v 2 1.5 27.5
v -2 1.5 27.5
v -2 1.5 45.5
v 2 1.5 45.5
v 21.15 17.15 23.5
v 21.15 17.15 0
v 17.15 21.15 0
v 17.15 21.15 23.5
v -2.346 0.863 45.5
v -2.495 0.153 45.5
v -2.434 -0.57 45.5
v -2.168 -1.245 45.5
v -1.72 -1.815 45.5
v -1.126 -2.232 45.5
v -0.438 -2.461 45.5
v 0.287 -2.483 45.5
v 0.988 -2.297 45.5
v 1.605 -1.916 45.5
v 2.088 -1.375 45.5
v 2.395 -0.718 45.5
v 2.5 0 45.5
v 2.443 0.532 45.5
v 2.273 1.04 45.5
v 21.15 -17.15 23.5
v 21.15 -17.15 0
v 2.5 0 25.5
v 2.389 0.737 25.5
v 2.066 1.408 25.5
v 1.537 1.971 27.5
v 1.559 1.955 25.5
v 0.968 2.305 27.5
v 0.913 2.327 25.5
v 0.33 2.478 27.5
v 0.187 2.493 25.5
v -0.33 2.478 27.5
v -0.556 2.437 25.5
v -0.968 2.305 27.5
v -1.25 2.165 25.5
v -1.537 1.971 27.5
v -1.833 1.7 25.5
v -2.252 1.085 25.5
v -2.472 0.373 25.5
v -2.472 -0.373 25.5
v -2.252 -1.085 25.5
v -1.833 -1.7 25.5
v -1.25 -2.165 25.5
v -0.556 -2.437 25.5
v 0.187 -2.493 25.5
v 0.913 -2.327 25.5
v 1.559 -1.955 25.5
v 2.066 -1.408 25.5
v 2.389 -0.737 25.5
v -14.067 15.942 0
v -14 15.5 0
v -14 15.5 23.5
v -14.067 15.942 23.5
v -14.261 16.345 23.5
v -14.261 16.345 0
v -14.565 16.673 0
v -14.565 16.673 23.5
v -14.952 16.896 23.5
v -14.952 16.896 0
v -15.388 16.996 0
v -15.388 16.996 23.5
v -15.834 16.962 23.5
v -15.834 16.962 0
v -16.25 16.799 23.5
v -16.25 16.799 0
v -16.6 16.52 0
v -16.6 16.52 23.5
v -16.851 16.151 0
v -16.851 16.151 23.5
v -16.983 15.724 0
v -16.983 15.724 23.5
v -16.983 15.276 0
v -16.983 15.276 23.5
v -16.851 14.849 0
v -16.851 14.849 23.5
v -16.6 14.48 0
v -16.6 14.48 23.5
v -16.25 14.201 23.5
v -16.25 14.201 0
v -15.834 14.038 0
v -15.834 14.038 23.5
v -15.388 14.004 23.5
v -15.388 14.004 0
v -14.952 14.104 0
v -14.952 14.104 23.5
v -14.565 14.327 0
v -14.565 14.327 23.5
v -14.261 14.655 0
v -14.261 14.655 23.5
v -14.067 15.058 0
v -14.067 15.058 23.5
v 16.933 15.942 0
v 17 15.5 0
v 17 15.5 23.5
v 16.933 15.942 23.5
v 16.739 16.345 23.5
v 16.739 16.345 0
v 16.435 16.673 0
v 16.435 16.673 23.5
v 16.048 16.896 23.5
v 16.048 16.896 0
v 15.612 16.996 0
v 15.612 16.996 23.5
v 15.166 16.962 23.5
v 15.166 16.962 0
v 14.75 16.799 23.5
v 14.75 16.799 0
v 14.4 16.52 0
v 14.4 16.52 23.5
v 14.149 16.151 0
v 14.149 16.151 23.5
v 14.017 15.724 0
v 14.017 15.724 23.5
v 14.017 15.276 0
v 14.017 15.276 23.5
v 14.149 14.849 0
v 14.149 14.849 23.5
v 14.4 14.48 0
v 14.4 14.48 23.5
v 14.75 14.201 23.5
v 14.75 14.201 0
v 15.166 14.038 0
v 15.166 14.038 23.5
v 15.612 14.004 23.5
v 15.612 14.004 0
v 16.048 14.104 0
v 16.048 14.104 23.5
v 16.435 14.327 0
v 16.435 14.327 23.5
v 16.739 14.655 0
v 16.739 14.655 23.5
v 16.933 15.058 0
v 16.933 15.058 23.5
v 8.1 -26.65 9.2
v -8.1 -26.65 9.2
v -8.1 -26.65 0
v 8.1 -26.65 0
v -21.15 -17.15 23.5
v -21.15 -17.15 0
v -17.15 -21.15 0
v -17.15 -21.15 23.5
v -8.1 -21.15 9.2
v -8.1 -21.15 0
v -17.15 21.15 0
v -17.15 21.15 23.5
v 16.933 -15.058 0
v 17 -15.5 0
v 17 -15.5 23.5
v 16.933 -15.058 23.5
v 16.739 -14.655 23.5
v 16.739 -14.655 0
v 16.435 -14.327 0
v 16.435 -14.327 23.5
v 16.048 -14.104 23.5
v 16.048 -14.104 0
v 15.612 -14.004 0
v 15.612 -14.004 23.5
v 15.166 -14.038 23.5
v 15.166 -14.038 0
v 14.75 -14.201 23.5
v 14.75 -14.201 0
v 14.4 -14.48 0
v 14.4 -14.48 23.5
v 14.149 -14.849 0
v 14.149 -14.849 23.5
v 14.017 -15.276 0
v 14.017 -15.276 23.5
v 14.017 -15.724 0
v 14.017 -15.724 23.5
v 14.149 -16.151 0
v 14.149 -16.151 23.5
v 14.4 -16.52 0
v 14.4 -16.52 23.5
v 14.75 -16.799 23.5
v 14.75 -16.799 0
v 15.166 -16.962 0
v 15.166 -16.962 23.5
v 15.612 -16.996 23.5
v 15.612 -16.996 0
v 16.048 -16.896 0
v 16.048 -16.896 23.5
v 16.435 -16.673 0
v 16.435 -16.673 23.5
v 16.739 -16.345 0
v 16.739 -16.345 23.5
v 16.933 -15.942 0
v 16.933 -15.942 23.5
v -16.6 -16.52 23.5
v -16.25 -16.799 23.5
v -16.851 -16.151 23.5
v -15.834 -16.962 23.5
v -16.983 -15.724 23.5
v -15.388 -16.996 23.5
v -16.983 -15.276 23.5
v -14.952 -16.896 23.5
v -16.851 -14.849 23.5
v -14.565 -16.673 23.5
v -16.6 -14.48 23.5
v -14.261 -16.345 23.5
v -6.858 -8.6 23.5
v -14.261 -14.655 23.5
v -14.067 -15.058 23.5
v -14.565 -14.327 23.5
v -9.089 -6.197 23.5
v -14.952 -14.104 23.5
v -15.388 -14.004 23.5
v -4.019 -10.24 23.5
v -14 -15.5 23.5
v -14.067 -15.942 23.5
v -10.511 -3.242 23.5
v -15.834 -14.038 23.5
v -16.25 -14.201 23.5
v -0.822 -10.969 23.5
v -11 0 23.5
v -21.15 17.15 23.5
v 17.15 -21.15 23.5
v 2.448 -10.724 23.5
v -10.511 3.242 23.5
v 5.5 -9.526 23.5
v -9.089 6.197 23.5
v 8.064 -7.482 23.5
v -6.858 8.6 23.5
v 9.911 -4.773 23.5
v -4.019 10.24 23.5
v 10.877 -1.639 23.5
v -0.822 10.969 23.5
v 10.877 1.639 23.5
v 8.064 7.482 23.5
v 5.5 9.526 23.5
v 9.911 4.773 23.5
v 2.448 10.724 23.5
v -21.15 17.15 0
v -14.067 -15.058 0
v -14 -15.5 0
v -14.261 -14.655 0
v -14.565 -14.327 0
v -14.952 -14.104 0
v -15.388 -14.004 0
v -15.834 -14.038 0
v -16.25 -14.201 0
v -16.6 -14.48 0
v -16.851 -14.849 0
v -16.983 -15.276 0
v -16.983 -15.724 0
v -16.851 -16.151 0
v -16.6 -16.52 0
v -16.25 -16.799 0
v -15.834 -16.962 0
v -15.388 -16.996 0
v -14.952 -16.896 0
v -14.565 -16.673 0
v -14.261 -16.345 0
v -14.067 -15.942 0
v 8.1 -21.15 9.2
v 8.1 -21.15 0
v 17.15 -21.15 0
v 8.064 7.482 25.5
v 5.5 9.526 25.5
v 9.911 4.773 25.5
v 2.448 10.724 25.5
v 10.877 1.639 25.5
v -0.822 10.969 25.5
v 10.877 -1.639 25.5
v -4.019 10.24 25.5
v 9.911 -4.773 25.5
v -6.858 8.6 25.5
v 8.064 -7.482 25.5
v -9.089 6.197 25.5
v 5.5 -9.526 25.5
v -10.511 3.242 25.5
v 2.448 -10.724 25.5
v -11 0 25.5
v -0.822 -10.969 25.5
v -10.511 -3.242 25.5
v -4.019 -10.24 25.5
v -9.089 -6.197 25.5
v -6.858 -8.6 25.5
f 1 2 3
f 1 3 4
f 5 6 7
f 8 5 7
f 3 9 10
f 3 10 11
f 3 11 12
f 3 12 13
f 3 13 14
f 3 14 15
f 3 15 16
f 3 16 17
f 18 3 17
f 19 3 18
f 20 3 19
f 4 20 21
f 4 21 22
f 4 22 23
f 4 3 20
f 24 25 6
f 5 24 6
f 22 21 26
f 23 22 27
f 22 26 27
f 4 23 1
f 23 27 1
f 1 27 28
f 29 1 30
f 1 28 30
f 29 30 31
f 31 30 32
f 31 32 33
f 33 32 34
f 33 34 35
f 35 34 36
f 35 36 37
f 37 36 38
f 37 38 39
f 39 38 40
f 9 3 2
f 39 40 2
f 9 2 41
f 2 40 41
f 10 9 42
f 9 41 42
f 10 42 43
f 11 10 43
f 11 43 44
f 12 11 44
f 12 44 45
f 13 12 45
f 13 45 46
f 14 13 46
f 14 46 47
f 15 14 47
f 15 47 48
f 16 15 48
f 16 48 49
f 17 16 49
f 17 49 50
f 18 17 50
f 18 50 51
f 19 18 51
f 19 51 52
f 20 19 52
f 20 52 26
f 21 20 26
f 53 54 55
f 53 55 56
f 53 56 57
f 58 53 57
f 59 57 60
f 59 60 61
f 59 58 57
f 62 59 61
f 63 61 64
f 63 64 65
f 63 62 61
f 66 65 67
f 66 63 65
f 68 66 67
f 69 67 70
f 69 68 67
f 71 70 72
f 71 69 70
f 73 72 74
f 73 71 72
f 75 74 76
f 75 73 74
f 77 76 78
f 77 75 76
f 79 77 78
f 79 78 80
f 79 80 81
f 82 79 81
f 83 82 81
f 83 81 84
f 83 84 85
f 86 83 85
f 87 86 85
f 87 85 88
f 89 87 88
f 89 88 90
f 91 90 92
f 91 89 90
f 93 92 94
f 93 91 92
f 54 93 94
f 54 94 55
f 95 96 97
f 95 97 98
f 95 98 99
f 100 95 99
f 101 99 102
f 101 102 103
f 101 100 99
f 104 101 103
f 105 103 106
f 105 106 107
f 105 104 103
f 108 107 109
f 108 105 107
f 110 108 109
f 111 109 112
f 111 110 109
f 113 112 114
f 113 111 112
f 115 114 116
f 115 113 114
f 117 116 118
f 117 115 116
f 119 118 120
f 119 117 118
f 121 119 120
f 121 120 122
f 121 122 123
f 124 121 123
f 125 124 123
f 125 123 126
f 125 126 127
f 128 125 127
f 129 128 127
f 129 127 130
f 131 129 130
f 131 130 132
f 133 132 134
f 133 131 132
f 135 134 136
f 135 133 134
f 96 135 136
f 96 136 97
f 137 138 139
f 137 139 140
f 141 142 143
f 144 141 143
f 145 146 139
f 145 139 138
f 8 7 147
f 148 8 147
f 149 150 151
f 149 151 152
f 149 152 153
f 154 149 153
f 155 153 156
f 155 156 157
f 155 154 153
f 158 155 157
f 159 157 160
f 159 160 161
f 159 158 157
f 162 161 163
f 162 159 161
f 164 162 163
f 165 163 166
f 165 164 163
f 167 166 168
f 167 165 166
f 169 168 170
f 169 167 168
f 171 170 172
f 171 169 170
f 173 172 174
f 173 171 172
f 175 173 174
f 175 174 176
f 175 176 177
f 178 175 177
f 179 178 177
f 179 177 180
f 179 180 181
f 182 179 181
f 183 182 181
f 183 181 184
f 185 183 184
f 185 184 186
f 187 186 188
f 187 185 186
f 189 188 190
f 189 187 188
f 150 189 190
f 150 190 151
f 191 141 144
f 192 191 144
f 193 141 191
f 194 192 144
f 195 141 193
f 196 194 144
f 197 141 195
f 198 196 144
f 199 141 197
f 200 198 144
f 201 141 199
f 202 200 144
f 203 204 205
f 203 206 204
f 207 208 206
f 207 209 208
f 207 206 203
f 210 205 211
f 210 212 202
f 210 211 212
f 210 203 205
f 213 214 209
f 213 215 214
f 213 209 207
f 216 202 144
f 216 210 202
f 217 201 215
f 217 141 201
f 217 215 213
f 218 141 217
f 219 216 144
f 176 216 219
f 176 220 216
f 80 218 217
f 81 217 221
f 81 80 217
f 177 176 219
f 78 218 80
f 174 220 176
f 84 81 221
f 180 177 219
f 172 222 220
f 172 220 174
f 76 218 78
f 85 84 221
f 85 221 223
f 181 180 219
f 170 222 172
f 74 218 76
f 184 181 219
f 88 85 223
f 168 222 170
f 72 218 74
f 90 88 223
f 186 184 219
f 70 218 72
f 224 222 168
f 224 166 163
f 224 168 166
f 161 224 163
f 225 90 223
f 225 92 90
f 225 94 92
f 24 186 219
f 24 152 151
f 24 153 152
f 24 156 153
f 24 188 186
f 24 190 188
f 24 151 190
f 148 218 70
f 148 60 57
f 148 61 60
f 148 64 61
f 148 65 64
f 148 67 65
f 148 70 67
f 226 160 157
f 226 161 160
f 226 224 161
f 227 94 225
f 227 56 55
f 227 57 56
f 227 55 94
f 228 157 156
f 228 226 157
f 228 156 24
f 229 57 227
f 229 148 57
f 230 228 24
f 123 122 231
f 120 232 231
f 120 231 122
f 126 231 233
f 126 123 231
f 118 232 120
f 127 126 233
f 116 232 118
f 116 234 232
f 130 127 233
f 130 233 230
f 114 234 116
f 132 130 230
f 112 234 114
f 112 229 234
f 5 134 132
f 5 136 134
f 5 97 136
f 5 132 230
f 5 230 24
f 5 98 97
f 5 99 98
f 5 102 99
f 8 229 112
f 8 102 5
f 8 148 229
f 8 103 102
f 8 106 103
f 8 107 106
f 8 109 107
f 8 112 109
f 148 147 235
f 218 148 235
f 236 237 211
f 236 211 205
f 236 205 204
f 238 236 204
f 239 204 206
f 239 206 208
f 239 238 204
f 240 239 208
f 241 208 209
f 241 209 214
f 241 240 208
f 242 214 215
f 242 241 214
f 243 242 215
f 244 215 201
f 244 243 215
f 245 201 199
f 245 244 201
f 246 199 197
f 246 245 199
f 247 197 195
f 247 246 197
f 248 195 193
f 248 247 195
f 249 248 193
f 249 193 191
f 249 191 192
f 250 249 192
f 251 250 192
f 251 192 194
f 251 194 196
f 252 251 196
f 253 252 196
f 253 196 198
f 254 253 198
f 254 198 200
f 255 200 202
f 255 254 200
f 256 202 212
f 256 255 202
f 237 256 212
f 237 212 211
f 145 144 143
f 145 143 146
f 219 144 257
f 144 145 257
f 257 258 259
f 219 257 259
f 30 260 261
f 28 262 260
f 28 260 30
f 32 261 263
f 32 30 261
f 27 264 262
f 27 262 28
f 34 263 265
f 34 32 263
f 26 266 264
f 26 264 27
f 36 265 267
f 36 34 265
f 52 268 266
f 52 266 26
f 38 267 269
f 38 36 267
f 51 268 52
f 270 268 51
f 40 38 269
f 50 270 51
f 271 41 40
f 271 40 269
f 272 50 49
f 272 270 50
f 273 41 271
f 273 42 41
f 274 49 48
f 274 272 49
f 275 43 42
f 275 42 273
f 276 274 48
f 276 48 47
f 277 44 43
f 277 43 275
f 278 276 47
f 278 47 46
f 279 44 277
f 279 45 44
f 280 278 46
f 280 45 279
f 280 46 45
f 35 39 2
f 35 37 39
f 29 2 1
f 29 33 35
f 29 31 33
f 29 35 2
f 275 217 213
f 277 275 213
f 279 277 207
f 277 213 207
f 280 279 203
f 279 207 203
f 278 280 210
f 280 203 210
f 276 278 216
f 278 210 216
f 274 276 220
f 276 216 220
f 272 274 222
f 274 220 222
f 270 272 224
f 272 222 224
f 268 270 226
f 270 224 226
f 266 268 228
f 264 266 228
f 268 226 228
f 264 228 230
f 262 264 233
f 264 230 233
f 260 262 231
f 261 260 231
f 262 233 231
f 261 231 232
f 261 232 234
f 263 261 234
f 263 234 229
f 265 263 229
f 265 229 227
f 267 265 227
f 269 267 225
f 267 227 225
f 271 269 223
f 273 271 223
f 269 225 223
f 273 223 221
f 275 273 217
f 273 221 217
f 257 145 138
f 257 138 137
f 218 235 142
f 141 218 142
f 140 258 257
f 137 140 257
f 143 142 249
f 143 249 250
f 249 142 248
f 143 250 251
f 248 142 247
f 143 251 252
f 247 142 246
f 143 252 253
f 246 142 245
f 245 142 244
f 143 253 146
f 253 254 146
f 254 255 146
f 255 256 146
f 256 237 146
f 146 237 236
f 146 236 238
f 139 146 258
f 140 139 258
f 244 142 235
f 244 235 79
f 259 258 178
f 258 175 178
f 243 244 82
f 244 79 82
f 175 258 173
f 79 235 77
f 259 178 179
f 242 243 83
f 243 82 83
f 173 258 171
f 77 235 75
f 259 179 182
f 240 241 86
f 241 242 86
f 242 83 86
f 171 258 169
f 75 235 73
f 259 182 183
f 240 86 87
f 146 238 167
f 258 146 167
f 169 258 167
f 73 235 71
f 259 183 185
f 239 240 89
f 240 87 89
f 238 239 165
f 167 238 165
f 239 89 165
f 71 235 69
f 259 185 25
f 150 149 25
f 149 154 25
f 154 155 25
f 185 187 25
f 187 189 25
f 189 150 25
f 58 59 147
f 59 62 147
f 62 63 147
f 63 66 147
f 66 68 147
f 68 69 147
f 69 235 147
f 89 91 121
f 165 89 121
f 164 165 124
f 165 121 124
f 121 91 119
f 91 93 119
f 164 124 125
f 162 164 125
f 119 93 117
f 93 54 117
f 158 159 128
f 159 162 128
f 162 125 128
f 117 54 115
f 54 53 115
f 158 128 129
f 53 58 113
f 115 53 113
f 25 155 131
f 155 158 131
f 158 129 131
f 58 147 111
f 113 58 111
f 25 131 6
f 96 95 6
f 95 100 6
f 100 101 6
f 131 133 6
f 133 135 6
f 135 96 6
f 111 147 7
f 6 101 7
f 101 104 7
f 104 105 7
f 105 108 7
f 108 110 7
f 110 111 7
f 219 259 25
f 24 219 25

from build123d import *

# Parameters (mm, degrees)
SKETCH1_R           = 1.5
BOSS_EXTRUDE1_DEPTH = 23.5
SKETCH2_W           = 16.2
SKETCH2_H           = 9.2
BOSS_EXTRUDE2_DEPTH = 5.5
SKETCH3_R           = 11
BOSS_EXTRUDE3_DEPTH = 2
SKETCH4_R           = 2.5
BOSS_EXTRUDE4_DEPTH = 20
SKETCH5_W           = 5
SKETCH5_H           = 18
CUT_EXTRUDE1_DEPTH  = 1


with BuildPart() as part:
    # Sketch1 → Boss-Extrude1 (new body)
    with BuildSketch(Plane.XY):
        Polygon((-17.15, -21.15), (17.15, -21.15), (21.15, -17.15), (21.15, 17.15), (17.15, 21.15), (-17.15, 21.15), (-21.15, 17.15), (-21.15, -17.15), align=None)
        with Locations((-15.5, 15.5)):
            Circle(SKETCH1_R, mode=Mode.SUBTRACT)
        with Locations((15.5, 15.5)):
            Circle(SKETCH1_R, mode=Mode.SUBTRACT)
        with Locations((15.5, -15.5)):
            Circle(SKETCH1_R, mode=Mode.SUBTRACT)
        with Locations((-15.5, -15.5)):
            Circle(SKETCH1_R, mode=Mode.SUBTRACT)
    extrude(amount=BOSS_EXTRUDE1_DEPTH)

    # Sketch2 → Boss-Extrude2 (add)
    with BuildSketch(Plane.XZ.offset(21.15)):
        with Locations((0, 4.6)):
            Rectangle(SKETCH2_W, SKETCH2_H)
    extrude(amount=BOSS_EXTRUDE2_DEPTH)

    # Sketch3 → Boss-Extrude3 (add)
    with BuildSketch(Plane.XY.offset(23.5)):
        with Locations(Location((0, 0, 0), (0, 0, 180))):
            Circle(SKETCH3_R)
    extrude(amount=BOSS_EXTRUDE3_DEPTH)

    # Sketch4 → Boss-Extrude4 (add)
    with BuildSketch(Plane.XY.offset(25.5)):
        Circle(SKETCH4_R)
    extrude(amount=BOSS_EXTRUDE4_DEPTH)

    # Sketch5 → Cut-Extrude1 (cut)
    with BuildSketch(Plane(origin=(0, 2.5, 0), x_dir=(1, 0, 0), z_dir=(0, 1, 0))):
        with Locations((0, -36.5)):
            Rectangle(SKETCH5_W, SKETCH5_H)
    extrude(amount=-CUT_EXTRUDE1_DEPTH, mode=Mode.SUBTRACT)


solid = part.part
